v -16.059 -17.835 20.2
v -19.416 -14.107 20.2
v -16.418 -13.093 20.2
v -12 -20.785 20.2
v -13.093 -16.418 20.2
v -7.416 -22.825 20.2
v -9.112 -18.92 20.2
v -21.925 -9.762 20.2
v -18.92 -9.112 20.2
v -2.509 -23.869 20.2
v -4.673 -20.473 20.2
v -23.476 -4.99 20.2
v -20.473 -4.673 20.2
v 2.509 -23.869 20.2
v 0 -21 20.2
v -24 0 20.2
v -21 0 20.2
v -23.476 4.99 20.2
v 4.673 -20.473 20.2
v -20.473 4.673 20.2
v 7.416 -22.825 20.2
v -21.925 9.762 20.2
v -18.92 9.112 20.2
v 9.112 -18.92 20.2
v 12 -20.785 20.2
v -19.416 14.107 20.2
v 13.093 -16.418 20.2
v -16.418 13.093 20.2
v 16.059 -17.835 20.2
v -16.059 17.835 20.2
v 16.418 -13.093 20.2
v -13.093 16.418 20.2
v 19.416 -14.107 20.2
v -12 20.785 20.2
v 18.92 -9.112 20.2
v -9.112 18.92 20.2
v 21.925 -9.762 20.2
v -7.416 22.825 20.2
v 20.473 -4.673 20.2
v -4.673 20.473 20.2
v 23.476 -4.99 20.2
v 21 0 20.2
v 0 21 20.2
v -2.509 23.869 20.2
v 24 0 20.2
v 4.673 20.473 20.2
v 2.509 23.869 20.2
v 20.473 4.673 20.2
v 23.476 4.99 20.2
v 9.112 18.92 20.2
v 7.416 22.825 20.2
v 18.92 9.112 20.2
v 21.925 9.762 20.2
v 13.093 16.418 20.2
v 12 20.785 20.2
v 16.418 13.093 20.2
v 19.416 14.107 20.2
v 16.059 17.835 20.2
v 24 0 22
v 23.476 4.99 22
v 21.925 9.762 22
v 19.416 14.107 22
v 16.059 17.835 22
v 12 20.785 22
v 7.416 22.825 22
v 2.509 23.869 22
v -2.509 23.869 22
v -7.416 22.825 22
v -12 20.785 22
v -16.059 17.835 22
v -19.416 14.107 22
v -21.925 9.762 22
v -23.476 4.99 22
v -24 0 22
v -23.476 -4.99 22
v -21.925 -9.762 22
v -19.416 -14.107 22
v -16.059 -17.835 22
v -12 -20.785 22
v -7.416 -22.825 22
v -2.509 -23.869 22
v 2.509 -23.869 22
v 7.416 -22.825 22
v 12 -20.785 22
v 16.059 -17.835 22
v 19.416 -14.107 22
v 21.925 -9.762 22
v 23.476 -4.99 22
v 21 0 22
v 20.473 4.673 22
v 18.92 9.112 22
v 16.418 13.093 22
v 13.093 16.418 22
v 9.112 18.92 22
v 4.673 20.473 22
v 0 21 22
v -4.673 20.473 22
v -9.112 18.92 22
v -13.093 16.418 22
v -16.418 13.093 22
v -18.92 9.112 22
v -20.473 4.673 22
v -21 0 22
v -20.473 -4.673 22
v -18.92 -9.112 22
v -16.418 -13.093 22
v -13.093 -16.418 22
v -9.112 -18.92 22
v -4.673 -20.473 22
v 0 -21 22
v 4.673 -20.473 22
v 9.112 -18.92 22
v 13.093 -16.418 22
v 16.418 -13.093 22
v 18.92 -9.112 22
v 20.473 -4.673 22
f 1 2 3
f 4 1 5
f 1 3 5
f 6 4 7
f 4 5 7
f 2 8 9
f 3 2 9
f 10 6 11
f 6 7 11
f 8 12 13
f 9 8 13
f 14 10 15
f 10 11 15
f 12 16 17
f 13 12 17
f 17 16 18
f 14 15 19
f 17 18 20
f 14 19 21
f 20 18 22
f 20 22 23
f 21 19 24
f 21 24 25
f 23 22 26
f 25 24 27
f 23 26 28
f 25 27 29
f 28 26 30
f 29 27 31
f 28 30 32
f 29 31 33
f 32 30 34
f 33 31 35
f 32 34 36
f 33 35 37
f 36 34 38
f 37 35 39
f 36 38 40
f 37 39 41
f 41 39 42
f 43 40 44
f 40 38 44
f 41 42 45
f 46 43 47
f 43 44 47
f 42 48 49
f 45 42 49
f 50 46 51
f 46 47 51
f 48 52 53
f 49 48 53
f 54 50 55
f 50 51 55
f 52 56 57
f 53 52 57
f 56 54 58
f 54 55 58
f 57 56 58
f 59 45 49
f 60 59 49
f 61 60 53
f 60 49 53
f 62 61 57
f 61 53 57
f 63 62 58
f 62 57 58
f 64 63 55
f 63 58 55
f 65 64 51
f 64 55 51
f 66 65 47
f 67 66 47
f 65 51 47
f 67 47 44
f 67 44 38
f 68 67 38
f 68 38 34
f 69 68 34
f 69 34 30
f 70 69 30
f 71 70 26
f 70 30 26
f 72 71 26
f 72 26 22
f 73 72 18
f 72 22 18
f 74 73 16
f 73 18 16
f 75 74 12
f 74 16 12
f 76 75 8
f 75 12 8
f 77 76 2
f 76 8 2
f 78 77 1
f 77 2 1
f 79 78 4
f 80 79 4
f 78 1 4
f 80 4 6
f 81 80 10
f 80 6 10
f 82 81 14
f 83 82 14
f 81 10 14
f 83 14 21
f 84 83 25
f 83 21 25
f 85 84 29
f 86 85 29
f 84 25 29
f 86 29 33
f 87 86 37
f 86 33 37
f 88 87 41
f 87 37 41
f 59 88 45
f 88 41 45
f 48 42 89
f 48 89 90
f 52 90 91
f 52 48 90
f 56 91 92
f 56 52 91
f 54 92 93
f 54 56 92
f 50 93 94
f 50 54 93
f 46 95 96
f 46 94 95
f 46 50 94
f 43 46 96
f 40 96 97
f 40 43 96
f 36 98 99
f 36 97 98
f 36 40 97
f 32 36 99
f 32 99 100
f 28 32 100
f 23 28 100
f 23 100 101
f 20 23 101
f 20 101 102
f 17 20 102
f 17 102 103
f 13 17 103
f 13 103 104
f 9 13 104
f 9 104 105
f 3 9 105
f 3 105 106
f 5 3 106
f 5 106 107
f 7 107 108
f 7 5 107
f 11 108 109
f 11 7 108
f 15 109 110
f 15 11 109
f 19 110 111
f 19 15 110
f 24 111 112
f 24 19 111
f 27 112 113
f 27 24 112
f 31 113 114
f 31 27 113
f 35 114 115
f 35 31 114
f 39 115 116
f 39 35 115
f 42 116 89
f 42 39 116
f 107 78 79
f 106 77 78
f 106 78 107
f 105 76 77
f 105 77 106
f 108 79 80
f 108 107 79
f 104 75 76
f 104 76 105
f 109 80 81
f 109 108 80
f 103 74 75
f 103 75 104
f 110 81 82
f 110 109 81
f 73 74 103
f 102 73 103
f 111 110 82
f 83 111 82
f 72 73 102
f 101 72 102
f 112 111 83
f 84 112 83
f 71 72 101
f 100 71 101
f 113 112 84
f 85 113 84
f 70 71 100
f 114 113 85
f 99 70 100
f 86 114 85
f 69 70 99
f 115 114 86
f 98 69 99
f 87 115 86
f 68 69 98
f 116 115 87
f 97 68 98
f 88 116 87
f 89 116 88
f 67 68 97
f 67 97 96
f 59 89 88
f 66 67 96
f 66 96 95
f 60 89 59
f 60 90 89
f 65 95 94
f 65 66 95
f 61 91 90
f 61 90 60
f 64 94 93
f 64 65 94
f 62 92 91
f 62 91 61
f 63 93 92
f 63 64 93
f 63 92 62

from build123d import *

# Parameters (mm, degrees)
CYLINDER071_R     = 21
CYLINDER071_DEPTH = 2
CYLINDER070_R     = 24
CYLINDER070_DEPTH = 1.8


with BuildPart() as cylinder071:
    # Cylinder071 → Cylinder071 (new body)
    with BuildSketch(Plane.XY.offset(20)):
        Circle(CYLINDER071_R)
    extrude(amount=CYLINDER071_DEPTH)


with BuildPart() as rim_support:
    # Cylinder070 → Cylinder070 (new body)
    with BuildSketch(Plane.XY.offset(20)):
        Circle(CYLINDER070_R)
    extrude(amount=CYLINDER070_DEPTH)

    # Cut020: cut Cylinder071
    add(cylinder071.part, mode=Mode.SUBTRACT)


with BuildPart() as rim_support_1:
    # Cut020 placement: moved
    add(rim_support.part.moved(Location((0, 0, 0.2))))


solid = rim_support_1.part
